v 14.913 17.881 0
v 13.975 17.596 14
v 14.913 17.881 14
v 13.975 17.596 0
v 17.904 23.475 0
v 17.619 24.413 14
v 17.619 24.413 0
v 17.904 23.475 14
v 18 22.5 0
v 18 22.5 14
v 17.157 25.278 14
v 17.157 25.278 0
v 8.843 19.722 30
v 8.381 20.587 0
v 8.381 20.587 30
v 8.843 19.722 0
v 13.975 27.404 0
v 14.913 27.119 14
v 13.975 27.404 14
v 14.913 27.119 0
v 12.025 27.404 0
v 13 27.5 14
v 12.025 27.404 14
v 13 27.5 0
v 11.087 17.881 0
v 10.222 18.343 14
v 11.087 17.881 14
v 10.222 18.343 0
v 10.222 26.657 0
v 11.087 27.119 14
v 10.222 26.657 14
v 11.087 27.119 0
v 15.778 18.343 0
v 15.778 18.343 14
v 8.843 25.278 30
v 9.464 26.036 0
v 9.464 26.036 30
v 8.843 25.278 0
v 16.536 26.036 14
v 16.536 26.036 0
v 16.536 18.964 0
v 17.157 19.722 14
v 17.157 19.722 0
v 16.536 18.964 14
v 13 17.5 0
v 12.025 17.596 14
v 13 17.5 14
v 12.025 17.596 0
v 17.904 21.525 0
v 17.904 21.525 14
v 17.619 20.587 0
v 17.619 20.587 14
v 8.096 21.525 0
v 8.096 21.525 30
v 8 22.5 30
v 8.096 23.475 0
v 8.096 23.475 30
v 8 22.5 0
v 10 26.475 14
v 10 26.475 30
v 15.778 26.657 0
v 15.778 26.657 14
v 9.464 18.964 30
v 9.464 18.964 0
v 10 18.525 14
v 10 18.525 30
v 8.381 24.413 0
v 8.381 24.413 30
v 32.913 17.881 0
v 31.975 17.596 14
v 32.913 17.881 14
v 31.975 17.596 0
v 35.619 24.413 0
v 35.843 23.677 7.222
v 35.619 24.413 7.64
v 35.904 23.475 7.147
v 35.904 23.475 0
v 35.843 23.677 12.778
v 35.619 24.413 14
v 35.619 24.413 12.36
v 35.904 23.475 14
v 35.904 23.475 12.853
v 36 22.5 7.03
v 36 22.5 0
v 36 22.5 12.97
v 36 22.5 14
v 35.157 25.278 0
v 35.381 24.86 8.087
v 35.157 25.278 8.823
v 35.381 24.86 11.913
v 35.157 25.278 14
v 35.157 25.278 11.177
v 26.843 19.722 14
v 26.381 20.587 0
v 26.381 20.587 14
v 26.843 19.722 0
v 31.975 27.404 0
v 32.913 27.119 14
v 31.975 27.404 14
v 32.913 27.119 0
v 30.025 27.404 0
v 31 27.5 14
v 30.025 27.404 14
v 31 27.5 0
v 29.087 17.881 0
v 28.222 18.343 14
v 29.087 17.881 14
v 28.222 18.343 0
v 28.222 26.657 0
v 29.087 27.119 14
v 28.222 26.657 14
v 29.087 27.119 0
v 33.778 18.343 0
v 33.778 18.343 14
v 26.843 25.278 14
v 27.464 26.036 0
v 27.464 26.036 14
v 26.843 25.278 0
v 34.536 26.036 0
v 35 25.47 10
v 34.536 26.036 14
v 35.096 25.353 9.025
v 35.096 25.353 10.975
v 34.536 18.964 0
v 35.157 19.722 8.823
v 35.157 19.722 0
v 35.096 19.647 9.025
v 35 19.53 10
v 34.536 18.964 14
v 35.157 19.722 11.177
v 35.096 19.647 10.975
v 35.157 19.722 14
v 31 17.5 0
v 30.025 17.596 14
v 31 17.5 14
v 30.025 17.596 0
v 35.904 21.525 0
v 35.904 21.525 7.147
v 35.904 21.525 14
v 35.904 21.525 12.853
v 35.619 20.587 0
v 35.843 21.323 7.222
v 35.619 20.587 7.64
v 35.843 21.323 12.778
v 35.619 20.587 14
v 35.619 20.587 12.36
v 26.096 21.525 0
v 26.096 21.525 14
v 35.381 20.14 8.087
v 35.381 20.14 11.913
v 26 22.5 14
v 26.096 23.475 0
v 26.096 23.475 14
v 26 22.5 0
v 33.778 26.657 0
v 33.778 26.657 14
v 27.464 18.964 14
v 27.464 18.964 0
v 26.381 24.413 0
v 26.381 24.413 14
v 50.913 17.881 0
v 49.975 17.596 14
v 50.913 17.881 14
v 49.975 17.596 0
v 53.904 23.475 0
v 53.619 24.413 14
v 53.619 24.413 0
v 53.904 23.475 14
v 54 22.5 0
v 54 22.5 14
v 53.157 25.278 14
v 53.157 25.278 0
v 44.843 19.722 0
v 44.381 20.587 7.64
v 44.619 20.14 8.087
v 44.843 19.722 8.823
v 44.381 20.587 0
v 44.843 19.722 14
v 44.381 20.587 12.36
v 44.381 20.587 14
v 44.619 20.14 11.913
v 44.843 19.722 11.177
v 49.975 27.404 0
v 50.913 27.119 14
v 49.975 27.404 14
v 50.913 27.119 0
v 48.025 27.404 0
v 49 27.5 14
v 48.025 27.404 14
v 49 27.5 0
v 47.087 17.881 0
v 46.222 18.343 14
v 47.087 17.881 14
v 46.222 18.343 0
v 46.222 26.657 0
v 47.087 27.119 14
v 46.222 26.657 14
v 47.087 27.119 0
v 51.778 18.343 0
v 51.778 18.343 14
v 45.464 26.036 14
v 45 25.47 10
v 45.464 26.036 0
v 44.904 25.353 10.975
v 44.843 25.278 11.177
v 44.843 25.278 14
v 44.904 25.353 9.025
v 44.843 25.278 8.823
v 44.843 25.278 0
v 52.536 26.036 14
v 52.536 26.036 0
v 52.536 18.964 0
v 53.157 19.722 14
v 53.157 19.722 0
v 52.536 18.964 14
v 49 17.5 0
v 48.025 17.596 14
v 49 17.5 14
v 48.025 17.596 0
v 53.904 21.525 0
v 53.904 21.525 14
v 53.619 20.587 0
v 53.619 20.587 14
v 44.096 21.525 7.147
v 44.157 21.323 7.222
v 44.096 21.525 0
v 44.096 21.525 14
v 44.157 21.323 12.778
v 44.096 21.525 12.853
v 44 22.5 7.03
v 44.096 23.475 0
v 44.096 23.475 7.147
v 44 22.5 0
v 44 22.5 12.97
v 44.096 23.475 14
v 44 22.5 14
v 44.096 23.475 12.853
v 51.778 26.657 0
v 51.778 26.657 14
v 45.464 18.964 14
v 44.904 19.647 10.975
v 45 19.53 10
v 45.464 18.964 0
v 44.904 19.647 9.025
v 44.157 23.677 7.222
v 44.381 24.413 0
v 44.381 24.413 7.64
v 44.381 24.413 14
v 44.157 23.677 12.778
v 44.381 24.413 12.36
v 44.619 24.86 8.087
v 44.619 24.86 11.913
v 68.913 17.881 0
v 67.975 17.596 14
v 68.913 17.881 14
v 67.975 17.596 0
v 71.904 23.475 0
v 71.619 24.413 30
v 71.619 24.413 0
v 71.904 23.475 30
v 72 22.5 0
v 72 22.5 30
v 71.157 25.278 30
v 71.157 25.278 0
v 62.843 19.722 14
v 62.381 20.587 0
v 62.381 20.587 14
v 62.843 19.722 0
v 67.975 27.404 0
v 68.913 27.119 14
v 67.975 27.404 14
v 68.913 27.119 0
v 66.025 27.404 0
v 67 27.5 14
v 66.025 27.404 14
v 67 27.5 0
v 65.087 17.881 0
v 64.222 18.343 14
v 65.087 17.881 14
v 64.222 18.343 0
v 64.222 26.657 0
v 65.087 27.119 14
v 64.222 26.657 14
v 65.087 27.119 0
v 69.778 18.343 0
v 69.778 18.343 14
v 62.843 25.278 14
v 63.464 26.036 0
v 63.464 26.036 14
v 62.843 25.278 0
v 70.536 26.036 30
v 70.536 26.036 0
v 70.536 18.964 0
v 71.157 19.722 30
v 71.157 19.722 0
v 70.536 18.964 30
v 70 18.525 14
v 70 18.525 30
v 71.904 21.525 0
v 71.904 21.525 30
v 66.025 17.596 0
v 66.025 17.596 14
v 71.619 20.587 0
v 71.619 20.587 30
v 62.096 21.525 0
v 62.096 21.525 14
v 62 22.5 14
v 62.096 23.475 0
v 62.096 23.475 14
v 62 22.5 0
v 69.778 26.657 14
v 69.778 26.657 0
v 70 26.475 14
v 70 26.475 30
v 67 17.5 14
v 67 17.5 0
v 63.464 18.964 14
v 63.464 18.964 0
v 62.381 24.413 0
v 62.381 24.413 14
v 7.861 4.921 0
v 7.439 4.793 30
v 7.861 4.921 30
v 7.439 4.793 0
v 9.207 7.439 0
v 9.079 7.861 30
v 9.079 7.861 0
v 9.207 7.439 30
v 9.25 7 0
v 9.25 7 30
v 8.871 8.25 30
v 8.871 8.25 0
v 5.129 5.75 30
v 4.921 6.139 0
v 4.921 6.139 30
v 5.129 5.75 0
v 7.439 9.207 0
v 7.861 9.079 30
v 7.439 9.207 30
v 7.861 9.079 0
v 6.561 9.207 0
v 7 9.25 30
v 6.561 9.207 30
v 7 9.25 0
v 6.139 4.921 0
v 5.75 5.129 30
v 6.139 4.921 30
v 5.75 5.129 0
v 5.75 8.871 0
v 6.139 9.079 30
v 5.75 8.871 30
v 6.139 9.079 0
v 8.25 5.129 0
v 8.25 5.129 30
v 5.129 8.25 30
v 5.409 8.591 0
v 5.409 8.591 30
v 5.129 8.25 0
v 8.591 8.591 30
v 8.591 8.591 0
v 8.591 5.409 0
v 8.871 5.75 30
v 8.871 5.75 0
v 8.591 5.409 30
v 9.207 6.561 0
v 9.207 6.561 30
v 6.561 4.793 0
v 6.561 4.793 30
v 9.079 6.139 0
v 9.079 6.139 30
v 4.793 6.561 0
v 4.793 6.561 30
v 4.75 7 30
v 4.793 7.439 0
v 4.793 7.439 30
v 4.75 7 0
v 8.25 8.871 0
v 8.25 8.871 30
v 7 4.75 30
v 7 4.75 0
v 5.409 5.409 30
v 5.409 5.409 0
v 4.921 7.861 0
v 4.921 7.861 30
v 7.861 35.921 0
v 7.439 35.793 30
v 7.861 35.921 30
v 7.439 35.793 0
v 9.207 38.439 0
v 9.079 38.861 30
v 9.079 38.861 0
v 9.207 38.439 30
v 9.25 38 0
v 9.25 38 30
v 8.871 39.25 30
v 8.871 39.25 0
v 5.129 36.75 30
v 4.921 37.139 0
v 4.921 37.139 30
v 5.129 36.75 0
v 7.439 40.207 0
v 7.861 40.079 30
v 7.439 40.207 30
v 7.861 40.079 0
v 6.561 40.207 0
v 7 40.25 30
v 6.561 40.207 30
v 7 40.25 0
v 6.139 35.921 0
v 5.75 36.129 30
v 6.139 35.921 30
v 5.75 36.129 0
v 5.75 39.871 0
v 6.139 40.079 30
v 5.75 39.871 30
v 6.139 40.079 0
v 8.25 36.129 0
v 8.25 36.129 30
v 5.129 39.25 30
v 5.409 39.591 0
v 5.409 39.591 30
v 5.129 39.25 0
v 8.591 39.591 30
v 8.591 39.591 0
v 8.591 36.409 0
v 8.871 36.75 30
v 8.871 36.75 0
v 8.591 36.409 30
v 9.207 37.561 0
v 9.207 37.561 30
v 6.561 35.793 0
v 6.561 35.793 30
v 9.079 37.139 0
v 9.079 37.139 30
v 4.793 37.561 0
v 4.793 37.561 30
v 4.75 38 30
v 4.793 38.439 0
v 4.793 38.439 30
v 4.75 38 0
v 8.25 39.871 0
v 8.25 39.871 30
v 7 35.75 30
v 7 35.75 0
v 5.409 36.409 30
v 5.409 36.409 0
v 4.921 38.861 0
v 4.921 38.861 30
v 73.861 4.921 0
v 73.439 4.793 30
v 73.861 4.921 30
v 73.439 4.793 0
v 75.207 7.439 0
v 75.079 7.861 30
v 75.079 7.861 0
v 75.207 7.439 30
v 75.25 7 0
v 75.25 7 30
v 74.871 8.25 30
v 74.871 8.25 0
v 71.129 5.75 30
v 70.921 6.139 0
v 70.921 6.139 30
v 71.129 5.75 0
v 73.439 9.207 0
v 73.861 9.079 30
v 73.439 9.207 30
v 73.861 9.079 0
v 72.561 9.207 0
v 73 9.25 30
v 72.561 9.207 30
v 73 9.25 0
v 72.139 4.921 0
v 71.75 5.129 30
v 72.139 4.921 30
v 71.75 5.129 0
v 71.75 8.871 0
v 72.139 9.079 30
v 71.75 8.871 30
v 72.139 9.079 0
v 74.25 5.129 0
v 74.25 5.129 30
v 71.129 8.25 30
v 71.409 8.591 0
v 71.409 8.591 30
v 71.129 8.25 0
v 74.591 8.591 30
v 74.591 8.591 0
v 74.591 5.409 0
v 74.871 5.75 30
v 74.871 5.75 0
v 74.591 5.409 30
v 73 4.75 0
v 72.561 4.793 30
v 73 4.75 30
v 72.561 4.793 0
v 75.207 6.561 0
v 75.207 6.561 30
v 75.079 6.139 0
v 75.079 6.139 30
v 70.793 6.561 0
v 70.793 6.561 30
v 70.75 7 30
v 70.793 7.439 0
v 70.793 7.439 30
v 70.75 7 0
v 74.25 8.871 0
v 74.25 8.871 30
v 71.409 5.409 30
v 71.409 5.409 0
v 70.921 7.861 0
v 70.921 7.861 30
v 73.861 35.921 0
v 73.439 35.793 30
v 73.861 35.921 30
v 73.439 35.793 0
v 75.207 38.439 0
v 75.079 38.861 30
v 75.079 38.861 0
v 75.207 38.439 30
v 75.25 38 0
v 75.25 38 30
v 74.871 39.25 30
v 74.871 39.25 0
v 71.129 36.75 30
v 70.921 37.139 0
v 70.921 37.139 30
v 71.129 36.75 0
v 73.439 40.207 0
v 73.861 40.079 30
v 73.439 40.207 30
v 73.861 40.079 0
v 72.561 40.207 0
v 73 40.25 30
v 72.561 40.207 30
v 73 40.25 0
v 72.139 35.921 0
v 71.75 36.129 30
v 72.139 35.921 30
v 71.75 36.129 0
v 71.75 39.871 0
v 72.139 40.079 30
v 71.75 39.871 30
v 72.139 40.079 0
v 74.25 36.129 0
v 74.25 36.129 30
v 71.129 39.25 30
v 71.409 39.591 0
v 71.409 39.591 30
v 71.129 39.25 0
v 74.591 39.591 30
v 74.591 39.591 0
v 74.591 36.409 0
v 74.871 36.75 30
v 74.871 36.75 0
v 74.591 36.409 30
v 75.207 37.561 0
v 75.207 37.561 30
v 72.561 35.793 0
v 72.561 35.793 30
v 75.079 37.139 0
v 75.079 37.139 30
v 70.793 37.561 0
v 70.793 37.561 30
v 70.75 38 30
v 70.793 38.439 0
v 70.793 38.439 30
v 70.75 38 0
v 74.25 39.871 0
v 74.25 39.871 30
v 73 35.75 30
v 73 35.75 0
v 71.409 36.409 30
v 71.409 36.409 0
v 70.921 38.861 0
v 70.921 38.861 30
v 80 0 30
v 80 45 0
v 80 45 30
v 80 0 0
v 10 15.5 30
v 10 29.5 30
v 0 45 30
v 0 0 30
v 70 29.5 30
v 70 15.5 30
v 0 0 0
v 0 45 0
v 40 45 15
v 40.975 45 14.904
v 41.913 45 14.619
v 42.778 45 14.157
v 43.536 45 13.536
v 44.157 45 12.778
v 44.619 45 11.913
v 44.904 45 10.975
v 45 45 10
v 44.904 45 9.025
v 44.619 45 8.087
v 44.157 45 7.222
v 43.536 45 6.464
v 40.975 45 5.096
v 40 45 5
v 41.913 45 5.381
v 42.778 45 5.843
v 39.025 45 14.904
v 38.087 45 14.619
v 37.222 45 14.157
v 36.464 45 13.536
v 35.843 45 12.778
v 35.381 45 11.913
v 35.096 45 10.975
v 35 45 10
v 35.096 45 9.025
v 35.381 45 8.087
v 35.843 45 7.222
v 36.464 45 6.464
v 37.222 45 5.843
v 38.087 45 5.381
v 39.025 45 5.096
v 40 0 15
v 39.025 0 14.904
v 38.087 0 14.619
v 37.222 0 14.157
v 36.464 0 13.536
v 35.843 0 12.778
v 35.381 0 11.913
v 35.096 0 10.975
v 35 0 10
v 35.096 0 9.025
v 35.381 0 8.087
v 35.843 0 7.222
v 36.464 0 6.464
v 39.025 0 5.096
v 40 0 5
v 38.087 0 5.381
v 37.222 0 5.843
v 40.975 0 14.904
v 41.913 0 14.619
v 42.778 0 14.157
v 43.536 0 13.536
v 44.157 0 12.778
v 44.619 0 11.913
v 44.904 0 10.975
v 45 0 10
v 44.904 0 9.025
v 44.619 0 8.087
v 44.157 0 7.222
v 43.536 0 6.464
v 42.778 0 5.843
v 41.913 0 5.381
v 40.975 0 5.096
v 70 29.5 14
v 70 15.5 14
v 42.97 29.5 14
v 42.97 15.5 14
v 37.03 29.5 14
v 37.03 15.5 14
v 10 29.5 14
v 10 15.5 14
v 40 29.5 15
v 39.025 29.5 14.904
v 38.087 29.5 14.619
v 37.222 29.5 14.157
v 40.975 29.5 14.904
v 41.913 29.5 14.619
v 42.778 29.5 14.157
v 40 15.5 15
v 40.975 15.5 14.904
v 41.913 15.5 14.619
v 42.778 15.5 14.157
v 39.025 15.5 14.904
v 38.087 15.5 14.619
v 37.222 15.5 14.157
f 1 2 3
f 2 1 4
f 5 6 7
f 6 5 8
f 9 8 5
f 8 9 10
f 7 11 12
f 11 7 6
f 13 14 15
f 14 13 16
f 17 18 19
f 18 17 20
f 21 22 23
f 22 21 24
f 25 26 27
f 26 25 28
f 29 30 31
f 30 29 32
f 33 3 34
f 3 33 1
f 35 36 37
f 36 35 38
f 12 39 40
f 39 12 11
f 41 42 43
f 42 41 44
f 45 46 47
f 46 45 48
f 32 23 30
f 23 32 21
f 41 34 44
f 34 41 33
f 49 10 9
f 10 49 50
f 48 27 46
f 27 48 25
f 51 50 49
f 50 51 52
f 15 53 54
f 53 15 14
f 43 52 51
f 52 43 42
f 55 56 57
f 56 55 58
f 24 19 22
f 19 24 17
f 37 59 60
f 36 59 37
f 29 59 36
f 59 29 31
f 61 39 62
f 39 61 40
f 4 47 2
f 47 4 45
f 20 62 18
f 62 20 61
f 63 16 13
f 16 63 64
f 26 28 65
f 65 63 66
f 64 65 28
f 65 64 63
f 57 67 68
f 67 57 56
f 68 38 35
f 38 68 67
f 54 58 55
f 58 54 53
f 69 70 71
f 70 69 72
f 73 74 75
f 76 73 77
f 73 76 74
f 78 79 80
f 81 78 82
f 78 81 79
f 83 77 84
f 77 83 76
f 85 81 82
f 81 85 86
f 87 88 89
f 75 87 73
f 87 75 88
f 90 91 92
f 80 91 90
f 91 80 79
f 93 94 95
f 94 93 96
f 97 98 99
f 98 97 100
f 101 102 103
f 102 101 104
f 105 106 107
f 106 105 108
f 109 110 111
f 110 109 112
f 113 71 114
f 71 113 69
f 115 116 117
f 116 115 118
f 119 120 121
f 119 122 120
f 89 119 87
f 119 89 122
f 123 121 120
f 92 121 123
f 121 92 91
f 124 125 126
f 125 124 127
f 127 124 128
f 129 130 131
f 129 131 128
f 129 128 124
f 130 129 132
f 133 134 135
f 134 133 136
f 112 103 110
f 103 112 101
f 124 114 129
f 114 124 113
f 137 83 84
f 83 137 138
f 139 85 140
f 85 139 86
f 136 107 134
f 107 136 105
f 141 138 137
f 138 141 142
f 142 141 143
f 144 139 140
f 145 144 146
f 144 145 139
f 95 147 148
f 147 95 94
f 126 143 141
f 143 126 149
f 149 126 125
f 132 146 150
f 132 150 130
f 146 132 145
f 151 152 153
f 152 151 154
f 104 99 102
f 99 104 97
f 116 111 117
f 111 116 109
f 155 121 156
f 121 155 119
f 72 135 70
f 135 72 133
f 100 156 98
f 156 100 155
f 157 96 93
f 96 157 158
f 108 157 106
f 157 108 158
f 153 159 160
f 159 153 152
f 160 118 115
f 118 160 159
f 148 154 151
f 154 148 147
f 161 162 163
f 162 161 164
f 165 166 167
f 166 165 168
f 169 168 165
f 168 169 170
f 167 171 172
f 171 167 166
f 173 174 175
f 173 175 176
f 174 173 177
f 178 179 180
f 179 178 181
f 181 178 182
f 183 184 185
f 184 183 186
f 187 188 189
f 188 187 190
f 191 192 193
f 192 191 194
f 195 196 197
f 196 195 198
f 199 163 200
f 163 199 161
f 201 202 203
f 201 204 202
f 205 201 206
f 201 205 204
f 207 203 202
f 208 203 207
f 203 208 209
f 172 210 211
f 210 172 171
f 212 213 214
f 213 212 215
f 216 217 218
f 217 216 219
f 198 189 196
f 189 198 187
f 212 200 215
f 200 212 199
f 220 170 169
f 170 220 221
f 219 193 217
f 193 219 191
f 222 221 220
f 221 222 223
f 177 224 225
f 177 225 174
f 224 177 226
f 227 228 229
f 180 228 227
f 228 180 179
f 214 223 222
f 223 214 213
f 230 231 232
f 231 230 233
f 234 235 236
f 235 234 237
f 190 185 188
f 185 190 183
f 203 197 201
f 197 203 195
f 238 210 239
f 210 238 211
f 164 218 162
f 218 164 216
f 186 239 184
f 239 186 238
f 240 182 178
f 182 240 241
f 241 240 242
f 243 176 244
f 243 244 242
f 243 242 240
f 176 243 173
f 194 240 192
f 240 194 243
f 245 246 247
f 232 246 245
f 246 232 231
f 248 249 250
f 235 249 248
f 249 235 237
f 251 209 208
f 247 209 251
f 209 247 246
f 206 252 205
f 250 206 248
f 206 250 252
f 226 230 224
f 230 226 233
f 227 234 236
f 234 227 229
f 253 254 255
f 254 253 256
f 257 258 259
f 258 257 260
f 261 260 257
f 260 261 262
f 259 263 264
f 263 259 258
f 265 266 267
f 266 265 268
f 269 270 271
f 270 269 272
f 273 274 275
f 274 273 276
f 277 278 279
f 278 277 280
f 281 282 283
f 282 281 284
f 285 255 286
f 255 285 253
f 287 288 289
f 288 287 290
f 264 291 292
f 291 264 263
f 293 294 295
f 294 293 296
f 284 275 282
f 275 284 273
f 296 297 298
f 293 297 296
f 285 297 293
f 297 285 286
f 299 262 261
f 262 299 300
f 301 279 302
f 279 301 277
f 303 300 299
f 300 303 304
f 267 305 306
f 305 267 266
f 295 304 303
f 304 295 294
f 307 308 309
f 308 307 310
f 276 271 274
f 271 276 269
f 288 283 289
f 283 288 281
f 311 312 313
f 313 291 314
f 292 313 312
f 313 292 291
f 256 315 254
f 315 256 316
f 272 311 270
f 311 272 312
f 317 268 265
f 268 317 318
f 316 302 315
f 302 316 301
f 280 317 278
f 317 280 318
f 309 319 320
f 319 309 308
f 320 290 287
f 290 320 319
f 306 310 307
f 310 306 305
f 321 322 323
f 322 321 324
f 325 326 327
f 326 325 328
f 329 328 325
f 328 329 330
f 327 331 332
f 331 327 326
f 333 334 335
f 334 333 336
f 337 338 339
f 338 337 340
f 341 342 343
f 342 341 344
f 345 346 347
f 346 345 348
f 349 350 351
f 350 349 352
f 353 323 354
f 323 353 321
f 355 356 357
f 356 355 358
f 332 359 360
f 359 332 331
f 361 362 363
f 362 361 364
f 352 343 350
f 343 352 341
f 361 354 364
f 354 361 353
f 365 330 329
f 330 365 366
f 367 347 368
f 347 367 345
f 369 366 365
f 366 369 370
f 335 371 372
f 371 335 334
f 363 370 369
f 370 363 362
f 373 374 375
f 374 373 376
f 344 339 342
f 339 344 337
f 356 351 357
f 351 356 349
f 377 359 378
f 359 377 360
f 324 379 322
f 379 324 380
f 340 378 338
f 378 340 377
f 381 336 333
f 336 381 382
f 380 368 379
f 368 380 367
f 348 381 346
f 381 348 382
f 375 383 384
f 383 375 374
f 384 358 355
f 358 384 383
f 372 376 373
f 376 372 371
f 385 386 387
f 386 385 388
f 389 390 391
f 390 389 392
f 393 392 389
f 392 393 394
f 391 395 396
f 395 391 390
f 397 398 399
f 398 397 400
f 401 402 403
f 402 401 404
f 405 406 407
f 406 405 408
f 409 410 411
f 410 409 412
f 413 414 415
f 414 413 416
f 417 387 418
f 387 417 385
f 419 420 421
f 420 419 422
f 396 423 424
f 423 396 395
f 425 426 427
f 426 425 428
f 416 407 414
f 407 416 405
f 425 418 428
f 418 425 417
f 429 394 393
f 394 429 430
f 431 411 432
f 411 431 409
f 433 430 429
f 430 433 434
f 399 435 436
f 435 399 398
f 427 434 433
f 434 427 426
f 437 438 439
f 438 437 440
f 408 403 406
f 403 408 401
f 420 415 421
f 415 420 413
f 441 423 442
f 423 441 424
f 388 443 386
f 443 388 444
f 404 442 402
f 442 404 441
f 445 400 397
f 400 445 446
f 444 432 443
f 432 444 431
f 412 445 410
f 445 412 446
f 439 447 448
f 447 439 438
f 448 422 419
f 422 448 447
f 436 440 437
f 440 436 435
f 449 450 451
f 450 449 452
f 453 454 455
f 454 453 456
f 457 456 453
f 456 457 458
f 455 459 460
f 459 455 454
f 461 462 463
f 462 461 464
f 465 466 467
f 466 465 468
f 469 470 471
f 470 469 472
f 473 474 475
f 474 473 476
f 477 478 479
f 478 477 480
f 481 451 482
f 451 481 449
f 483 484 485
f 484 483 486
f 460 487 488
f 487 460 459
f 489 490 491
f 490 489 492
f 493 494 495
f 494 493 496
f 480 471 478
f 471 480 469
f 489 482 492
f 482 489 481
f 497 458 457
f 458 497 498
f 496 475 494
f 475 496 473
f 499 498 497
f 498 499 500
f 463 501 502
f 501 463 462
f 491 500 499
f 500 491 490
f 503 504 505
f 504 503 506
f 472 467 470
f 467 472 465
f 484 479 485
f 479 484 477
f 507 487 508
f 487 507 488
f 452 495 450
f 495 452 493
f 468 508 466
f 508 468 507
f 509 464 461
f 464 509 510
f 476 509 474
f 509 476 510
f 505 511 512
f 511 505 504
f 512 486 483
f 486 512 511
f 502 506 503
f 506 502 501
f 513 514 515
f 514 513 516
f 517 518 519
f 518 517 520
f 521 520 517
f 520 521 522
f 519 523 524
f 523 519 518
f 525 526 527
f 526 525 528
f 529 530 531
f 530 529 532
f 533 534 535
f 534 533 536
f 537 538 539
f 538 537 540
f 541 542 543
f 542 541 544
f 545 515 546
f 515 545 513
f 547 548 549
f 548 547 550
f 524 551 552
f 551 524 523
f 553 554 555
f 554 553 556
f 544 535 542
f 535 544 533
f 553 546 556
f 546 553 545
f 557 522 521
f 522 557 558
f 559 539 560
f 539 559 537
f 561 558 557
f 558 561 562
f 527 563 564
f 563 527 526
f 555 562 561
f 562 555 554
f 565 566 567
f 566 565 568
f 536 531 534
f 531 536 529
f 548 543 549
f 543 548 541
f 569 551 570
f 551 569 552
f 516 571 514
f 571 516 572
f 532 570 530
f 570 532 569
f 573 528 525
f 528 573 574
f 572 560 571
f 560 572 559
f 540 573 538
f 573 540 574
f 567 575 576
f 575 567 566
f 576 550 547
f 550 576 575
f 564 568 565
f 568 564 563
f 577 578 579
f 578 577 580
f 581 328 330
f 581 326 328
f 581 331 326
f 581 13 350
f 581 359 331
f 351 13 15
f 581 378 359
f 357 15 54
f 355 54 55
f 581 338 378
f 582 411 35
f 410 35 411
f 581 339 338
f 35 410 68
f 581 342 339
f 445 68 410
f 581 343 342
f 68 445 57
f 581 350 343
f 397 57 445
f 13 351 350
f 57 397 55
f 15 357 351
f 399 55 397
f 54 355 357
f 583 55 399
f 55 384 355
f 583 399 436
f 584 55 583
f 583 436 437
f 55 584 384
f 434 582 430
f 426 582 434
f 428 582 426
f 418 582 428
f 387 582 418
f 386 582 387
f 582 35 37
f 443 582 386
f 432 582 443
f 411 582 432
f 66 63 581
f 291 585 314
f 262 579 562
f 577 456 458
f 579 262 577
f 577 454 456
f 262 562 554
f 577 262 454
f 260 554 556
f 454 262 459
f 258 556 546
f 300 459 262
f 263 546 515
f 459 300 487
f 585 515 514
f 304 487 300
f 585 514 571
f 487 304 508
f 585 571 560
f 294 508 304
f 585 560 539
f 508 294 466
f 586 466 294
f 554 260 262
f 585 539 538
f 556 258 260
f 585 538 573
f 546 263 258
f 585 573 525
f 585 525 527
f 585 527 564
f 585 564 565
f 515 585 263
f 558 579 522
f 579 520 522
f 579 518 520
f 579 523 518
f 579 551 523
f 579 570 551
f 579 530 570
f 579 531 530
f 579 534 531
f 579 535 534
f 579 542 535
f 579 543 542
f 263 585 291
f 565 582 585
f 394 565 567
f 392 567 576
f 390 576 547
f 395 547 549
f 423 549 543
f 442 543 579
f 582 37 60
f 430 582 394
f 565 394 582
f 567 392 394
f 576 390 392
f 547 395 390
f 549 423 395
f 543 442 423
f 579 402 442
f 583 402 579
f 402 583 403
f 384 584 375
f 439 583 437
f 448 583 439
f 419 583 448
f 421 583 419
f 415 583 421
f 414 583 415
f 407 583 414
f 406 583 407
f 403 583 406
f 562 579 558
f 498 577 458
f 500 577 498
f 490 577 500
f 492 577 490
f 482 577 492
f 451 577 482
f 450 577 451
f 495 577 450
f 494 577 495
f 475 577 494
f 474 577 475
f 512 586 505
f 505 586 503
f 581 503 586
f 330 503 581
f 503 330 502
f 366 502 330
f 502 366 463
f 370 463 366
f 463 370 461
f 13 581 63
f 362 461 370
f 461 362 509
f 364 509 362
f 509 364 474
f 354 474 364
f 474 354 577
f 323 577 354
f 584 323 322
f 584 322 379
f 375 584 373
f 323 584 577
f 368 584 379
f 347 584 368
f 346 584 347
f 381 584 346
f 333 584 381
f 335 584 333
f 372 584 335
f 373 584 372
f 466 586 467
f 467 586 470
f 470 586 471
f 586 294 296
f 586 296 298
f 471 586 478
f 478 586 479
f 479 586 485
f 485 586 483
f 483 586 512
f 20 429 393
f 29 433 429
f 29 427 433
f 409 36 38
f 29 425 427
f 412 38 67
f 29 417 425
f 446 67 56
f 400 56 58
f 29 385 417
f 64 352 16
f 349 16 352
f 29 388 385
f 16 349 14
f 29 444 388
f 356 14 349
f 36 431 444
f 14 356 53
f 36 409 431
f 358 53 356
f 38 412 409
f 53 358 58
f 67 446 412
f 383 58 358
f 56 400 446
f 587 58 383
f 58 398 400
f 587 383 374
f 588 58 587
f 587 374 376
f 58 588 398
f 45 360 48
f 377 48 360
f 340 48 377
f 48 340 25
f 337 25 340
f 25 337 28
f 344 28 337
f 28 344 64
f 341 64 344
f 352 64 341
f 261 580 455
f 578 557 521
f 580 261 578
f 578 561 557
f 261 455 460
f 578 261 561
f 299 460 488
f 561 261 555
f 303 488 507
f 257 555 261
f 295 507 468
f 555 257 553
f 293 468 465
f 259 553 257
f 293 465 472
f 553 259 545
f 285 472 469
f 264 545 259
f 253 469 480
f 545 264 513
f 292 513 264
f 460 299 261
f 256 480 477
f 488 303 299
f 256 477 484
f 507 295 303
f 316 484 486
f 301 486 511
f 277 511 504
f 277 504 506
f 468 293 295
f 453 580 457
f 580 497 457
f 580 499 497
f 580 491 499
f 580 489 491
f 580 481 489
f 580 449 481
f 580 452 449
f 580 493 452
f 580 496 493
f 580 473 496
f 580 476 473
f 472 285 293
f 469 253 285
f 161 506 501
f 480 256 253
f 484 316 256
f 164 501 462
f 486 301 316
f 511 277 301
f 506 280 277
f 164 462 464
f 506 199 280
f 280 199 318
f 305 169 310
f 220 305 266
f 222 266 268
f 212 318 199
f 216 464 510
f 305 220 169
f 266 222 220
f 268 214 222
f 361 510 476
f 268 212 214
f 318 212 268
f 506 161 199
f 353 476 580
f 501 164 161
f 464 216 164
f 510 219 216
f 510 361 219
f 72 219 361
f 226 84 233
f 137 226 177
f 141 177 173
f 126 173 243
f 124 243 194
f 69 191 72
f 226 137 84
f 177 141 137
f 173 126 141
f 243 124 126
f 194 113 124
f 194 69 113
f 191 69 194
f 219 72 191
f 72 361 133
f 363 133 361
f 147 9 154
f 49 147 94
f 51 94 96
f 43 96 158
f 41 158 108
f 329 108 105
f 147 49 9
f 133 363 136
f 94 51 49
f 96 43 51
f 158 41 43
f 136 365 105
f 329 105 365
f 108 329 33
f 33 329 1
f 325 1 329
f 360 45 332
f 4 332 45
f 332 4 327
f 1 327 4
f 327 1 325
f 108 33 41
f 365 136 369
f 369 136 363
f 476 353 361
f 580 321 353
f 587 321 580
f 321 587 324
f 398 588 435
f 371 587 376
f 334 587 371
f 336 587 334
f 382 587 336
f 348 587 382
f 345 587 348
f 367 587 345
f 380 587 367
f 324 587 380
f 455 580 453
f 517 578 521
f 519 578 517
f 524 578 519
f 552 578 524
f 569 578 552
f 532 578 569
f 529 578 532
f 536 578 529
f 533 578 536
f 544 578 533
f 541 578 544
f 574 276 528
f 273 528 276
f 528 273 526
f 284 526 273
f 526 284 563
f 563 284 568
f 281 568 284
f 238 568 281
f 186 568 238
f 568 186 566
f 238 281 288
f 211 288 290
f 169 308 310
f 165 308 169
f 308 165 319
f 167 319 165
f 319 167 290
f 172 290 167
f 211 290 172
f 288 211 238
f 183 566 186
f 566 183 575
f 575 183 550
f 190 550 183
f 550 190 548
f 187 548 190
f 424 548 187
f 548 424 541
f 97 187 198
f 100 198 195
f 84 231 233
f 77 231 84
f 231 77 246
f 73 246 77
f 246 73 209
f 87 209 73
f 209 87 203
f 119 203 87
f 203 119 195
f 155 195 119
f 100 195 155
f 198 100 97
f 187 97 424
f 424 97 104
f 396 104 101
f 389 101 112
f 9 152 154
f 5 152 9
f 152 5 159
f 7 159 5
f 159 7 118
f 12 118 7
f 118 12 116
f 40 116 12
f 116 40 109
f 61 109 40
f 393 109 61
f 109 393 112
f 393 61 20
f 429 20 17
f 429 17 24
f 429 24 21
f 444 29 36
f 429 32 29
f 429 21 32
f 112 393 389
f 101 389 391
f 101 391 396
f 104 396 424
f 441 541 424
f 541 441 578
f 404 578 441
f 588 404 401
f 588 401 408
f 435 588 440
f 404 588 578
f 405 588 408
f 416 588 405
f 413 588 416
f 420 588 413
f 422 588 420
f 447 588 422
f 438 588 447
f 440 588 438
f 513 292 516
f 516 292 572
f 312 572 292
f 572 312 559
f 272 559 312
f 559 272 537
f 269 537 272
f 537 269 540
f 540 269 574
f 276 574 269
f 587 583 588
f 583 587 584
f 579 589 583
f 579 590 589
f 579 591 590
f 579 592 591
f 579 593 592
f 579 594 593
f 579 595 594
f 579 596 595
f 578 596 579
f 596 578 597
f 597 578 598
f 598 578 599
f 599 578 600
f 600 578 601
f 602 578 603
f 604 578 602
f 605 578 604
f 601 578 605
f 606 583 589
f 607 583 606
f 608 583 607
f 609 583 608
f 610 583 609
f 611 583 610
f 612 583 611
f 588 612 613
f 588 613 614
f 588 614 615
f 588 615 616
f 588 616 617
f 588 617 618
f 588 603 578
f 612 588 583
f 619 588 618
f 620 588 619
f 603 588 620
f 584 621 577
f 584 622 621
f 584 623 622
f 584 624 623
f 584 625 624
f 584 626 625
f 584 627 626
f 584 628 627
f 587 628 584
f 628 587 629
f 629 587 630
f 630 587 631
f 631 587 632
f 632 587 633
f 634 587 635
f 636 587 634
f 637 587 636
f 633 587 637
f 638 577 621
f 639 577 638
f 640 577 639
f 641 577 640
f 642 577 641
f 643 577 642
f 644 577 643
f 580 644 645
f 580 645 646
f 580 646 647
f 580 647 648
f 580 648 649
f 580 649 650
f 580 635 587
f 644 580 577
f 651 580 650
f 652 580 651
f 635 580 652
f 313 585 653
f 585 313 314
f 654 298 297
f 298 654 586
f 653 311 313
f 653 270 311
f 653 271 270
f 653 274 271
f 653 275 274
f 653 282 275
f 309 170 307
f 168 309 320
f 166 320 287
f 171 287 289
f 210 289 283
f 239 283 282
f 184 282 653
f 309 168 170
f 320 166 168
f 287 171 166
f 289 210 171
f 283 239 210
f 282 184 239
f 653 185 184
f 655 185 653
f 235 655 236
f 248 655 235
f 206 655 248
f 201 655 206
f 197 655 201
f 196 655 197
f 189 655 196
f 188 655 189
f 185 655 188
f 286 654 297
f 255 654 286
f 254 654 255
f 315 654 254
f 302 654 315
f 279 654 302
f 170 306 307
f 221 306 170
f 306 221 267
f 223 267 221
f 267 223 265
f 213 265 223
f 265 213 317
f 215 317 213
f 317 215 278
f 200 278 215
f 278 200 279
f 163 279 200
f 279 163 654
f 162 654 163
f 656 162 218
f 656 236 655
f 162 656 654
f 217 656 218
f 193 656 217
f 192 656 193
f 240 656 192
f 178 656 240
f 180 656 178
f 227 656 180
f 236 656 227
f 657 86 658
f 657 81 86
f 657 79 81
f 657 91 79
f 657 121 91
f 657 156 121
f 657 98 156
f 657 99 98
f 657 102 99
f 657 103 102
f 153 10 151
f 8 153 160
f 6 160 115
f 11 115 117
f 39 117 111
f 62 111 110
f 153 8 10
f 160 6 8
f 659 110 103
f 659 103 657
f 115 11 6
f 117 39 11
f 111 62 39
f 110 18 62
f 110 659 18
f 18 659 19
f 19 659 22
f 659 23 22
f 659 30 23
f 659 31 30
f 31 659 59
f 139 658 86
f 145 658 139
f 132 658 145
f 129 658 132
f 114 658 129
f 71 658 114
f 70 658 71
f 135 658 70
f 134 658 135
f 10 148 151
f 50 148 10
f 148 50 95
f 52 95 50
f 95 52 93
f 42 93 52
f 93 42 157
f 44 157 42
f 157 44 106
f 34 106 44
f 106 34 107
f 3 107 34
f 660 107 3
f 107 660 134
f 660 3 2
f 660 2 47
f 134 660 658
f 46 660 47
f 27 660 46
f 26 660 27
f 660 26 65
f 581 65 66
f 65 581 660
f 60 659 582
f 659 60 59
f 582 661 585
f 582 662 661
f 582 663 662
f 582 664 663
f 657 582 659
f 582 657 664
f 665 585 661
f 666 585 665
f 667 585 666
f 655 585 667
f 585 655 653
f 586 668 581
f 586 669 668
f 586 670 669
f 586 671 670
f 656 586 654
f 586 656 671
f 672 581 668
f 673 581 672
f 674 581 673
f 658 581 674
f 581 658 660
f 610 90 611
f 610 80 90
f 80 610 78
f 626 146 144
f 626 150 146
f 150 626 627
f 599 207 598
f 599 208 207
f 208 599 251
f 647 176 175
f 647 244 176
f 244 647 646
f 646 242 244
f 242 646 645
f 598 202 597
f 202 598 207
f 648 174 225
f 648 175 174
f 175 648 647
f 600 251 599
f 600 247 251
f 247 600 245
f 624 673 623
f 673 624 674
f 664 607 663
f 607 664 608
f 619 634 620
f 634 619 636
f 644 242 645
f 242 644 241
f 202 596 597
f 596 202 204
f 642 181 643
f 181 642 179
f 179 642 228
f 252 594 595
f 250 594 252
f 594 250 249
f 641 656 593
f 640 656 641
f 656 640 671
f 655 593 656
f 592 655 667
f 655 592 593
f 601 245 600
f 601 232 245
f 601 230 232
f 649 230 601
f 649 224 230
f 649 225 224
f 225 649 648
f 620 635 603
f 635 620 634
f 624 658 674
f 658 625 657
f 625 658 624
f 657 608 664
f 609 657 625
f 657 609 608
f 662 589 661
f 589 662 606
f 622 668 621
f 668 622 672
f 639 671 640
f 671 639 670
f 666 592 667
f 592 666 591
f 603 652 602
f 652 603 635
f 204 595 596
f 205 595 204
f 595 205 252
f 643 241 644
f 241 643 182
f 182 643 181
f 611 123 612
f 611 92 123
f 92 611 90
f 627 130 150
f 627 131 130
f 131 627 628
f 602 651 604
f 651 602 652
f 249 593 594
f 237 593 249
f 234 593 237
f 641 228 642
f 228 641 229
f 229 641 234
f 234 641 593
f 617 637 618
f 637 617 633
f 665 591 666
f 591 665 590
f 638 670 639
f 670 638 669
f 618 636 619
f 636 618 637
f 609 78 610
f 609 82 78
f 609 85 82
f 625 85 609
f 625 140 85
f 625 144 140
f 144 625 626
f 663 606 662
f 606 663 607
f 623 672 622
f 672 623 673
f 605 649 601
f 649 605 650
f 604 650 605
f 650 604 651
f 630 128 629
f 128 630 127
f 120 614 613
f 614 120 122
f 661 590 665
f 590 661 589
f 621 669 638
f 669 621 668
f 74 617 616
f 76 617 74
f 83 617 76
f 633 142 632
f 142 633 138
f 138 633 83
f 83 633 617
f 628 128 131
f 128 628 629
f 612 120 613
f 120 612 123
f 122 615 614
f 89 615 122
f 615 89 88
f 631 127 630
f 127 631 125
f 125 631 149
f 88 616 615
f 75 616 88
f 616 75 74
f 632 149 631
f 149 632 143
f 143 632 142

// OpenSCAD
$fn = 32;

// ----------------------------------------------------------------------
// Manifold block: side_outlet manifold
// ----------------------------------------------------------------------

// --- parameters (mm) ---
block_l = 80;             // block length, X
block_w = 45;             // block width, Y
block_h = 30;             // block height, Z
port_d = 10;              // port bore diameter
port_pitch = 18;          // port pitch along X
gallery_d = 14;           // top gallery width, Y
gallery_depth = 16;       // gallery pocket depth
wall_p = 10;              // gallery end wall thickness, X
mnt_d = 4.5;              // mounting hole diameter
mnt_in = 7;               // mounting hole inset from the edges
out_d = 10;               // outlet bore diameter
out_z = 10;               // outlet axis height

n_ports = 4;  // ports in the row
port_x0 = (block_l - (n_ports - 1) * port_pitch) / 2;  // first port X

difference() {
  cube([block_l, block_w, block_h]);
  for (i = [0 : n_ports - 1])
    translate([port_x0 + i * port_pitch, block_w / 2, -1])
      cylinder(h = block_h + 2, d = port_d);
  translate([wall_p, block_w / 2 - gallery_d / 2, block_h - gallery_depth])
    cube([block_l - 2 * wall_p, gallery_d, gallery_depth + 1]);
  for (cx = [mnt_in, block_l - mnt_in])
    for (cy = [mnt_in, block_w - mnt_in])
      translate([cx, cy, -1]) cylinder(h = block_h + 2, d = mnt_d);
  translate([block_l / 2, -1, out_z]) rotate([-90, 0, 0])
    cylinder(h = block_w + 2, d = out_d);
}
